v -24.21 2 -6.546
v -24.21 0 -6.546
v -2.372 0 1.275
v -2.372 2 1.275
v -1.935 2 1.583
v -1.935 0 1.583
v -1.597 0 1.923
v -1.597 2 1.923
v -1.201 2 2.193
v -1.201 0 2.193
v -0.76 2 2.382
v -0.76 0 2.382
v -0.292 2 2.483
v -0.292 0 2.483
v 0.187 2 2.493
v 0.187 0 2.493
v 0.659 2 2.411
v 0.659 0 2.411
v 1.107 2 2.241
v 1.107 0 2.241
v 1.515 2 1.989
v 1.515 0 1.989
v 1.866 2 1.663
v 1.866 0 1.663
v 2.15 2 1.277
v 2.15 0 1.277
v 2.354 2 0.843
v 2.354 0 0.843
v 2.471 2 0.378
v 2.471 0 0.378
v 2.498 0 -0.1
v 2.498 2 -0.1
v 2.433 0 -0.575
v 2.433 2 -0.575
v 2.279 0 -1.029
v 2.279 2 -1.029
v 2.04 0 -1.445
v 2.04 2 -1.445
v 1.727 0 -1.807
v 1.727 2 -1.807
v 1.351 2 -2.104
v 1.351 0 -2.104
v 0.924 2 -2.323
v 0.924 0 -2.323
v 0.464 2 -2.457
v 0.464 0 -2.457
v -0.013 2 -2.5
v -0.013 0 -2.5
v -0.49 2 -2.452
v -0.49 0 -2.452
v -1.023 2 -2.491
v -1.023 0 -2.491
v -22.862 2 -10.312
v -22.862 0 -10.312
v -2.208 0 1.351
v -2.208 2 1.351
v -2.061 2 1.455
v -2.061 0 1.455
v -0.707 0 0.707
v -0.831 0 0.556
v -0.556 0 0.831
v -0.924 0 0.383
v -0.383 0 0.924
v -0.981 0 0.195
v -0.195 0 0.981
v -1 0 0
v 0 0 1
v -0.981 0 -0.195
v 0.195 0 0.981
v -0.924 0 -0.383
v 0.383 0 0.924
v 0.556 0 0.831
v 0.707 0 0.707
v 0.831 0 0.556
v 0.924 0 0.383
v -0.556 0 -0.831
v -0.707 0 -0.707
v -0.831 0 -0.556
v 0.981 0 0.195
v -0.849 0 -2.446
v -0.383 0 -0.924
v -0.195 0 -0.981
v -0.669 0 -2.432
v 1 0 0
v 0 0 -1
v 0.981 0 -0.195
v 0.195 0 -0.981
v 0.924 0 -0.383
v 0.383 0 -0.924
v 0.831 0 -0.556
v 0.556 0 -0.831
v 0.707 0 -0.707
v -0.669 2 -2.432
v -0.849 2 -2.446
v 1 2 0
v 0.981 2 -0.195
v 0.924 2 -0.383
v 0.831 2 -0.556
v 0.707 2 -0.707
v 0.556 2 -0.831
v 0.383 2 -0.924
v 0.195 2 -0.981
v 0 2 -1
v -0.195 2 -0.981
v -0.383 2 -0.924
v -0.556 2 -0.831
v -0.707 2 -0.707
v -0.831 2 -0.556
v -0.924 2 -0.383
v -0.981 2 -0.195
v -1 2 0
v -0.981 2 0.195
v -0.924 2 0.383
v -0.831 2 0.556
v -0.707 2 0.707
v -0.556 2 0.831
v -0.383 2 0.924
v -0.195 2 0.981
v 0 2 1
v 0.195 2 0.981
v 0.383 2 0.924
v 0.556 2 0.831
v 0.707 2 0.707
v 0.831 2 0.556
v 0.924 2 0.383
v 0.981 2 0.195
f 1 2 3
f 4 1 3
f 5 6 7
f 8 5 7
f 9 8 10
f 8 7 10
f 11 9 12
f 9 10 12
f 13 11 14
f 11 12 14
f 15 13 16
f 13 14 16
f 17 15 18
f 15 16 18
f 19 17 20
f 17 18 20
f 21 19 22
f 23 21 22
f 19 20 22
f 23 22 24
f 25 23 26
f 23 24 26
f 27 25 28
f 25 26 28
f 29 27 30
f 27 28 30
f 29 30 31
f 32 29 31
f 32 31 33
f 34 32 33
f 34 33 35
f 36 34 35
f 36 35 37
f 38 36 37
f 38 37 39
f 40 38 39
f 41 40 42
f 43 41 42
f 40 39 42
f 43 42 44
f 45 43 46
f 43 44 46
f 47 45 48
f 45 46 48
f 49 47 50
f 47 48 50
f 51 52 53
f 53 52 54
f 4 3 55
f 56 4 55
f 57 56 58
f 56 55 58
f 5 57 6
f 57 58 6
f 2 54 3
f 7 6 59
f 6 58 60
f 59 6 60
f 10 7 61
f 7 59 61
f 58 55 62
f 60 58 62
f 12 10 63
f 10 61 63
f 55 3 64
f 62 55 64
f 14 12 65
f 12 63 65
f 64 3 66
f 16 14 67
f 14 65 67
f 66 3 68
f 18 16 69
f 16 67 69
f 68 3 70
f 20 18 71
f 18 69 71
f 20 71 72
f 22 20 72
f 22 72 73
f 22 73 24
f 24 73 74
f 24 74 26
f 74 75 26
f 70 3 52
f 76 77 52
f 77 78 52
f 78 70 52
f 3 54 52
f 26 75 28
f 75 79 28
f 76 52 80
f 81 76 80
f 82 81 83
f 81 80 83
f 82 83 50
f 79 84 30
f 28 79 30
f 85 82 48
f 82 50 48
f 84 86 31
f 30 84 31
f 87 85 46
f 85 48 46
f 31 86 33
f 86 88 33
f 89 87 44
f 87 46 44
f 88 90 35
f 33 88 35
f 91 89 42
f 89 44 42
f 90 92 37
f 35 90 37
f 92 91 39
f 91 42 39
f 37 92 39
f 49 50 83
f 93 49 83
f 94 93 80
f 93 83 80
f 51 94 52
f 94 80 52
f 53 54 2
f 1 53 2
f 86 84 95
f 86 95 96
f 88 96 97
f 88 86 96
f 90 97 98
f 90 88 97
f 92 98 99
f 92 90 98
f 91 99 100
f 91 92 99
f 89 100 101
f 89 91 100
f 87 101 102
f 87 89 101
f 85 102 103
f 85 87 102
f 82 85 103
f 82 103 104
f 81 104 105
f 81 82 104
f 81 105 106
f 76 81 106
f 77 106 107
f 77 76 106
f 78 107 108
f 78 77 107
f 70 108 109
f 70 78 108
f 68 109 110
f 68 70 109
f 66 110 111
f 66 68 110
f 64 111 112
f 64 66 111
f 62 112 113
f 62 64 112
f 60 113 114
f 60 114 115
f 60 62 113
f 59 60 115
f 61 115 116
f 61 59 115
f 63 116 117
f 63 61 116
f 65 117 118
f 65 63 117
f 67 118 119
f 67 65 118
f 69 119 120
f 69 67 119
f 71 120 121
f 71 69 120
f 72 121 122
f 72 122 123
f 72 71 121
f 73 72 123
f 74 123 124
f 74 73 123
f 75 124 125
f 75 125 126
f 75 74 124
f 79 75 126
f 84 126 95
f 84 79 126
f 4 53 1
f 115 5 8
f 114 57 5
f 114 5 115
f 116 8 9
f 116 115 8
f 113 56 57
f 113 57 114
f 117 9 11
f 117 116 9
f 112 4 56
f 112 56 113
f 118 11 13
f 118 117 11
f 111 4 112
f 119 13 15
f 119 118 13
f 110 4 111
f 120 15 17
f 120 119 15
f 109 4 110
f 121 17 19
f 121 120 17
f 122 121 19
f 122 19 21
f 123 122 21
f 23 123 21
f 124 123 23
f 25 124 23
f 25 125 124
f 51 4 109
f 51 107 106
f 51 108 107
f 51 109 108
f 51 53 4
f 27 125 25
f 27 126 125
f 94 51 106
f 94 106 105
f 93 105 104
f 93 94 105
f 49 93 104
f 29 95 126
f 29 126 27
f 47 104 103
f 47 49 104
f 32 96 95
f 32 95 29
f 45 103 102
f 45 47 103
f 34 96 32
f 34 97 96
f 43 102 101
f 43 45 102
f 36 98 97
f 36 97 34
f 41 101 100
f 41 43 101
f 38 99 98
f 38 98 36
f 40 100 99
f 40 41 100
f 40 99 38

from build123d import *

# Parameters (mm, degrees)
SKETCH1_R           = 1
BOSS_EXTRUDE1_DEPTH = 2


with BuildPart() as part:
    # Sketch1 → Boss-Extrude1 (new body)
    with BuildSketch(Plane(origin=(0, 0, 0), x_dir=(1, 0, 0), z_dir=(0, 1, 0))):
        with BuildLine():
            Line((-1.022874436, 2.490728385), (-22.861764958, 10.312114381))
            Line((-22.861764958, 10.312114381), (-24.21044114, 6.546337894))
            Line((-24.21044114, 6.546337894), (-2.371550618, -1.275048103))
            ThreePointArc((-2.371550618, -1.275048103), (-2.132203917, -1.399406187), (-1.93479976, -1.583208732))
            ThreePointArc((-1.93479976, -1.583208732), (2.353610305, -0.842922614), (-0.489789565, 2.451551791))
            ThreePointArc((-0.489789565, 2.451551791), (-0.758998088, 2.434862033), (-1.022874436, 2.490728385))
        make_face()
        Circle(SKETCH1_R, mode=Mode.SUBTRACT)
    extrude(amount=BOSS_EXTRUDE1_DEPTH)


solid = part.part
